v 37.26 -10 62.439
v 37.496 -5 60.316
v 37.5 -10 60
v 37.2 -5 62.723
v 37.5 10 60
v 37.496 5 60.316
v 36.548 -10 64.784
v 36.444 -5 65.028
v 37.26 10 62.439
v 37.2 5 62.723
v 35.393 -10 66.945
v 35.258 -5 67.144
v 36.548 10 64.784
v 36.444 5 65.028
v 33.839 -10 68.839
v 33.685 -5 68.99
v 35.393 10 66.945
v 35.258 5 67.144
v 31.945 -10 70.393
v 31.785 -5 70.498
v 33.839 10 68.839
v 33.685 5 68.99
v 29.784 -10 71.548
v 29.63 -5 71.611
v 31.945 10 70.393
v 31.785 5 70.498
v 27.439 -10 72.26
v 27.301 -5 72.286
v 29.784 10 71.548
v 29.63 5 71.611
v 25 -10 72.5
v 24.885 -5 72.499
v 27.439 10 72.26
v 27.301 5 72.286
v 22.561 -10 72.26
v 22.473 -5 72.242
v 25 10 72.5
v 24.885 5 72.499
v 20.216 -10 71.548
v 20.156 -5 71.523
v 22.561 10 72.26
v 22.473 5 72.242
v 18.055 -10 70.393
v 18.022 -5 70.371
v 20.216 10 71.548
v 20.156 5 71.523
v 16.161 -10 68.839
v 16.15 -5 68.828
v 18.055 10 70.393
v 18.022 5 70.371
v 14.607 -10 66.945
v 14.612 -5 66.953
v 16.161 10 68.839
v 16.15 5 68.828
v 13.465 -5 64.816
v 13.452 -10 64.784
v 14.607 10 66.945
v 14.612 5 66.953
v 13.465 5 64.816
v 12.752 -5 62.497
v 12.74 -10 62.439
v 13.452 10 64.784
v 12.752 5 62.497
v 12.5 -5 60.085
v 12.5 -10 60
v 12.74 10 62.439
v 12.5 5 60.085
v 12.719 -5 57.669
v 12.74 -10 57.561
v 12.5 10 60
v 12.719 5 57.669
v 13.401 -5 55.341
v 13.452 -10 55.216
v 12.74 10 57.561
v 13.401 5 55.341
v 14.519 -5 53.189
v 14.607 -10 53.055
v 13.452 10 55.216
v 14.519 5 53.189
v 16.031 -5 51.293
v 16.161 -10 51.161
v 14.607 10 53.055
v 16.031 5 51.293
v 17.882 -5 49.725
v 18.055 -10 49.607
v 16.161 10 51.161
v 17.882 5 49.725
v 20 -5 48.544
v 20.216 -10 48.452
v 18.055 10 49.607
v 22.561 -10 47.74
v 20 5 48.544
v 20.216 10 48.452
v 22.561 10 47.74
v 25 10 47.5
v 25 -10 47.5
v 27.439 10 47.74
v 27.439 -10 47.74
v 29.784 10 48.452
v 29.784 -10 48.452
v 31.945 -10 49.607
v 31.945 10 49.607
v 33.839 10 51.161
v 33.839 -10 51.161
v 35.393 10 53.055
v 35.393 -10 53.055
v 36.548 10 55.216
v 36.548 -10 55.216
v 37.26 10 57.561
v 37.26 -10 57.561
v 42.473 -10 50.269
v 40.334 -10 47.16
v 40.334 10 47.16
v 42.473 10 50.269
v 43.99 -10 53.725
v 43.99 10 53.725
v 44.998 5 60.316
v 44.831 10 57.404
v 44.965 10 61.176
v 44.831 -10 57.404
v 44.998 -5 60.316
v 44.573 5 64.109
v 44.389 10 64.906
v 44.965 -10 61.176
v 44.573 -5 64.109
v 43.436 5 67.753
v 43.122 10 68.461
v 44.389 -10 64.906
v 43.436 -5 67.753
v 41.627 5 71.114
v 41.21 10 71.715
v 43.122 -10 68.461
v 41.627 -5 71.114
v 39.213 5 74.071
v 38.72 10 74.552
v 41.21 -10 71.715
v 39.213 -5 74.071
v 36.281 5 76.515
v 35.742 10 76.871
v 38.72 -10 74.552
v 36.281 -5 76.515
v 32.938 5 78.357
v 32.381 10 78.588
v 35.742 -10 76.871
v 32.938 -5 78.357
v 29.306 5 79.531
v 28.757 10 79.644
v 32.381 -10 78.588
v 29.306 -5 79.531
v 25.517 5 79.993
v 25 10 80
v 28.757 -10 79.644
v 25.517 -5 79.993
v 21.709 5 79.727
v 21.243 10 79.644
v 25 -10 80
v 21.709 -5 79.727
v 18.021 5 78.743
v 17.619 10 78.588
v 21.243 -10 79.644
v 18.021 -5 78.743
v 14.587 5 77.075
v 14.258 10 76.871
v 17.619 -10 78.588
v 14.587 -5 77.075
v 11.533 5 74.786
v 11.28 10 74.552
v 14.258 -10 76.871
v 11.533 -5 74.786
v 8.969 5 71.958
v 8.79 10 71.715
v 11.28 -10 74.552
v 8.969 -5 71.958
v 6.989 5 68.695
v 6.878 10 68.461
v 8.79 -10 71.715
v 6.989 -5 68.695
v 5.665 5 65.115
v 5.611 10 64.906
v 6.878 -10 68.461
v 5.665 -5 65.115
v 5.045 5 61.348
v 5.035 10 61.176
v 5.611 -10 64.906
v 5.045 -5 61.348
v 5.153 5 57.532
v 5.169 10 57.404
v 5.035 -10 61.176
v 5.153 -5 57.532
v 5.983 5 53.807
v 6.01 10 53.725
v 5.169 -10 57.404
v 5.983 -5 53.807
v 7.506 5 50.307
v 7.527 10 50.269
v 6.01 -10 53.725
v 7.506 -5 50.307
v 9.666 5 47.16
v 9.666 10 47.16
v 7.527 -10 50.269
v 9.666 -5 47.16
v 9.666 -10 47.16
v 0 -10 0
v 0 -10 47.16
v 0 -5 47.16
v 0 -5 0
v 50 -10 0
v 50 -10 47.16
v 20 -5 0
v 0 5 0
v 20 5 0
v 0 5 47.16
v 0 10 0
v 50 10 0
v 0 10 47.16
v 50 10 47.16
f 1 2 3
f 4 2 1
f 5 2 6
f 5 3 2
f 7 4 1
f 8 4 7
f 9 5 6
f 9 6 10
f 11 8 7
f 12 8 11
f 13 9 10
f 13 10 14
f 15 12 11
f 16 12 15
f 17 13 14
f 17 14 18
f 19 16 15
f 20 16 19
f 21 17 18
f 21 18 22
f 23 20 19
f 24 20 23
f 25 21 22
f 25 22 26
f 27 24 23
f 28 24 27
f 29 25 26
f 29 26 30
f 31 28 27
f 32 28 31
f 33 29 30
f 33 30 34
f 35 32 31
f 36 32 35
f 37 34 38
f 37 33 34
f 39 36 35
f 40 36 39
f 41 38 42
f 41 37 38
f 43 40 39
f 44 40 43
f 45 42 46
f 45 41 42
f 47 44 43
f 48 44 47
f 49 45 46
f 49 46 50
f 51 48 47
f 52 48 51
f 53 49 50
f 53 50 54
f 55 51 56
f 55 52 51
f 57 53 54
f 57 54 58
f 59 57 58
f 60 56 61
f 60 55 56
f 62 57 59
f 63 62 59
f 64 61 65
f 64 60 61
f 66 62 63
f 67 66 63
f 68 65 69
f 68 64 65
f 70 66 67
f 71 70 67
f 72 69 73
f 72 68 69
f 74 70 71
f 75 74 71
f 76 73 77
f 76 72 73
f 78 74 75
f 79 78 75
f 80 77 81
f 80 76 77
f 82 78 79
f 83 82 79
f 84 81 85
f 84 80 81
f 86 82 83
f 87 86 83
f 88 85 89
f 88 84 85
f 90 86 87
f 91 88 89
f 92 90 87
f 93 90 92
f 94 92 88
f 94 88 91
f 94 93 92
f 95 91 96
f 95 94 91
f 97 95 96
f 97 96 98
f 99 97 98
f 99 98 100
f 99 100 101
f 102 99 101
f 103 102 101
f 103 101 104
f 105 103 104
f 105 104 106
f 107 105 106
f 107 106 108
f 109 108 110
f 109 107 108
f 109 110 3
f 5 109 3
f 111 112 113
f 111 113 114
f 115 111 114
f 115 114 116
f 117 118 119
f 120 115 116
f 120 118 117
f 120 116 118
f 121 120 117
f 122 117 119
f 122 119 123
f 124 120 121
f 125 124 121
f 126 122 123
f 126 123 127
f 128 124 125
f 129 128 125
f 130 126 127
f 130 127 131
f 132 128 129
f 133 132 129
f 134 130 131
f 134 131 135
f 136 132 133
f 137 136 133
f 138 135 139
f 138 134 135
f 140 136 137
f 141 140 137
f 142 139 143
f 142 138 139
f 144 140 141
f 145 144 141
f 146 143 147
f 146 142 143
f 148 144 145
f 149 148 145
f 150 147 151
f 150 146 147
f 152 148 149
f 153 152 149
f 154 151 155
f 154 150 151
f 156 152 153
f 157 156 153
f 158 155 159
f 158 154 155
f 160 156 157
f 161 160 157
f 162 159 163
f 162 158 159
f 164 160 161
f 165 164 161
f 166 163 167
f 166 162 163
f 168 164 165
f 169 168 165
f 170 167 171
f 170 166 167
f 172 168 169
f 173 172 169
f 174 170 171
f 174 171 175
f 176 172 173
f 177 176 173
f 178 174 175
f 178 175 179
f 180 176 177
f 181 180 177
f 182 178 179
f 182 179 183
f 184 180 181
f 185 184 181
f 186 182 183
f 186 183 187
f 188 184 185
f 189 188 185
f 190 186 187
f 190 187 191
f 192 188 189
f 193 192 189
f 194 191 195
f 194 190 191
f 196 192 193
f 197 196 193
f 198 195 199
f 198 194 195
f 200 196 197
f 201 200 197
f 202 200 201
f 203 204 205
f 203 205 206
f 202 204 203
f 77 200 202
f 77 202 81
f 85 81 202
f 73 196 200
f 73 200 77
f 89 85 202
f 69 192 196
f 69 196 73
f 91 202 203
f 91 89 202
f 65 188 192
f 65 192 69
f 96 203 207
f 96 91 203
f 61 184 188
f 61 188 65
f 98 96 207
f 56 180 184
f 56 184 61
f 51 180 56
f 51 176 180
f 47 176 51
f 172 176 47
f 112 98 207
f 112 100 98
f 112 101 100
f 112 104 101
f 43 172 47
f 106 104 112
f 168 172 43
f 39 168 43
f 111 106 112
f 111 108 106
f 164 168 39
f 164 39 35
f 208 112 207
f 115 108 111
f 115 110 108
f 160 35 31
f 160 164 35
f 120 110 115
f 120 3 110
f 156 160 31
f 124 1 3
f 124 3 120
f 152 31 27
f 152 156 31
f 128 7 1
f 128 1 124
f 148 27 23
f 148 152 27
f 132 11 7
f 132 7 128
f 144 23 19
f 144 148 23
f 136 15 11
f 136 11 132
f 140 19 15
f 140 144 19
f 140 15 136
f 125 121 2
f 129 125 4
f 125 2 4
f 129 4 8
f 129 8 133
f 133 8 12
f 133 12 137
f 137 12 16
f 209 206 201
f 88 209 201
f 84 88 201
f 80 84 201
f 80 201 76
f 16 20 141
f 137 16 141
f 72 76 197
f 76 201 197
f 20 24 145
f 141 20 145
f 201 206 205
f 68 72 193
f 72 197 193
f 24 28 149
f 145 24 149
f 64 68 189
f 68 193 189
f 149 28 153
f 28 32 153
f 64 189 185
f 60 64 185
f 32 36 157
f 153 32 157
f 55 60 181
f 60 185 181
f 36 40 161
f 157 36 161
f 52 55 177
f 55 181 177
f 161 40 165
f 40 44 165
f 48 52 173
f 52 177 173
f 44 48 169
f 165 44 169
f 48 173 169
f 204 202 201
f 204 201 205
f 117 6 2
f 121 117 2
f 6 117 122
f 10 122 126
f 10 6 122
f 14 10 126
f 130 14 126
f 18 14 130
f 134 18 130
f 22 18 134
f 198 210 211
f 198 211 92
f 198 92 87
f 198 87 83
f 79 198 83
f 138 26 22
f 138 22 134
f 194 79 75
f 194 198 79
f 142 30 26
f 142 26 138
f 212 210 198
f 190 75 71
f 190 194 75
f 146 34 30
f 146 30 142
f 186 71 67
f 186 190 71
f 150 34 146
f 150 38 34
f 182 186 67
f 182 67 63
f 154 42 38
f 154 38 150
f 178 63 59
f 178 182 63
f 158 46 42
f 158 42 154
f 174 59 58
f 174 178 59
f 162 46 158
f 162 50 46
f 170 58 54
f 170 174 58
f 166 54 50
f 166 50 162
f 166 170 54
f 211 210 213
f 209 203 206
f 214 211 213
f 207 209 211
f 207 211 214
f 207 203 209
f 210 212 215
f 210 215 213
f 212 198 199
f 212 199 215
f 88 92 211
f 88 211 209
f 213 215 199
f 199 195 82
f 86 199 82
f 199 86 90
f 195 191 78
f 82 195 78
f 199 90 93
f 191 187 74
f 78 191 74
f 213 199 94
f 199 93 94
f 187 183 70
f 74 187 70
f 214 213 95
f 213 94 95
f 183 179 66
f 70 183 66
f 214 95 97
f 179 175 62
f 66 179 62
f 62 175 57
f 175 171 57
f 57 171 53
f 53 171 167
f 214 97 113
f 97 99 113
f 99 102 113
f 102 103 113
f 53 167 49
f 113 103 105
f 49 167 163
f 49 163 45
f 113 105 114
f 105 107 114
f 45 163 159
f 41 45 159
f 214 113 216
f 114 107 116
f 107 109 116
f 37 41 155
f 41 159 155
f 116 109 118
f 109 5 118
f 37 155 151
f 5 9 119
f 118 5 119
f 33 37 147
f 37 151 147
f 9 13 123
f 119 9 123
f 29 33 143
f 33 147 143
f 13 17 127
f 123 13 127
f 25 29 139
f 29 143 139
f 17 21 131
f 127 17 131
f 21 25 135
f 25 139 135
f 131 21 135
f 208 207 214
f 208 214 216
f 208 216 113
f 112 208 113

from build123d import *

# Parameters (mm, degrees)
F0_R     = 12.5
F1_DEPTH = 10
F2_W     = 10
F2_H     = 90.439778
F3_DEPTH = 20
F5_DEPTH = 30.001


with BuildPart() as f1:
    # F0 (on Front) → F1 (new body, symmetric)
    with BuildSketch(Plane.XZ):
        with BuildLine():
            Line((0, 47.159518), (0, 0))
            Line((0, 0), (50, 0))
            Line((50, 0), (50, 47.159518))
            Line((50, 47.159518), (40.333689, 47.159518))
            ThreePointArc((40.333689, 47.159518), (25, 80), (9.666311, 47.159518))
            Line((9.666311, 47.159518), (0, 47.159518))
        make_face()
        with Locations((25, 60)):
            Circle(F0_R, mode=Mode.SUBTRACT)
    extrude(amount=F1_DEPTH, both=True)

    # F2 (on face) → F3 (cut, symmetric)
    with BuildSketch(Plane(origin=(0, 0, 0), x_dir=(0, -1, 0), z_dir=(-1, 0, 0))):
        with Locations((0, 45.219889)):
            Rectangle(F2_W, F2_H)
    extrude(amount=F3_DEPTH, both=True, mode=Mode.SUBTRACT)

    # F4 (on face) → F5 (cut, through all)
    with BuildSketch(Plane(origin=(20, 0, 0), x_dir=(0, -1, 0), z_dir=(-1, 0, 0))):
        Polygon((5, 84.635349), (-5, 81.45997), (-5, 71.508407), (-5, 60.315875), (5, 60.315875), (5, 71.456439), align=None)
    extrude(amount=-F5_DEPTH, mode=Mode.SUBTRACT)


solid = f1.part
